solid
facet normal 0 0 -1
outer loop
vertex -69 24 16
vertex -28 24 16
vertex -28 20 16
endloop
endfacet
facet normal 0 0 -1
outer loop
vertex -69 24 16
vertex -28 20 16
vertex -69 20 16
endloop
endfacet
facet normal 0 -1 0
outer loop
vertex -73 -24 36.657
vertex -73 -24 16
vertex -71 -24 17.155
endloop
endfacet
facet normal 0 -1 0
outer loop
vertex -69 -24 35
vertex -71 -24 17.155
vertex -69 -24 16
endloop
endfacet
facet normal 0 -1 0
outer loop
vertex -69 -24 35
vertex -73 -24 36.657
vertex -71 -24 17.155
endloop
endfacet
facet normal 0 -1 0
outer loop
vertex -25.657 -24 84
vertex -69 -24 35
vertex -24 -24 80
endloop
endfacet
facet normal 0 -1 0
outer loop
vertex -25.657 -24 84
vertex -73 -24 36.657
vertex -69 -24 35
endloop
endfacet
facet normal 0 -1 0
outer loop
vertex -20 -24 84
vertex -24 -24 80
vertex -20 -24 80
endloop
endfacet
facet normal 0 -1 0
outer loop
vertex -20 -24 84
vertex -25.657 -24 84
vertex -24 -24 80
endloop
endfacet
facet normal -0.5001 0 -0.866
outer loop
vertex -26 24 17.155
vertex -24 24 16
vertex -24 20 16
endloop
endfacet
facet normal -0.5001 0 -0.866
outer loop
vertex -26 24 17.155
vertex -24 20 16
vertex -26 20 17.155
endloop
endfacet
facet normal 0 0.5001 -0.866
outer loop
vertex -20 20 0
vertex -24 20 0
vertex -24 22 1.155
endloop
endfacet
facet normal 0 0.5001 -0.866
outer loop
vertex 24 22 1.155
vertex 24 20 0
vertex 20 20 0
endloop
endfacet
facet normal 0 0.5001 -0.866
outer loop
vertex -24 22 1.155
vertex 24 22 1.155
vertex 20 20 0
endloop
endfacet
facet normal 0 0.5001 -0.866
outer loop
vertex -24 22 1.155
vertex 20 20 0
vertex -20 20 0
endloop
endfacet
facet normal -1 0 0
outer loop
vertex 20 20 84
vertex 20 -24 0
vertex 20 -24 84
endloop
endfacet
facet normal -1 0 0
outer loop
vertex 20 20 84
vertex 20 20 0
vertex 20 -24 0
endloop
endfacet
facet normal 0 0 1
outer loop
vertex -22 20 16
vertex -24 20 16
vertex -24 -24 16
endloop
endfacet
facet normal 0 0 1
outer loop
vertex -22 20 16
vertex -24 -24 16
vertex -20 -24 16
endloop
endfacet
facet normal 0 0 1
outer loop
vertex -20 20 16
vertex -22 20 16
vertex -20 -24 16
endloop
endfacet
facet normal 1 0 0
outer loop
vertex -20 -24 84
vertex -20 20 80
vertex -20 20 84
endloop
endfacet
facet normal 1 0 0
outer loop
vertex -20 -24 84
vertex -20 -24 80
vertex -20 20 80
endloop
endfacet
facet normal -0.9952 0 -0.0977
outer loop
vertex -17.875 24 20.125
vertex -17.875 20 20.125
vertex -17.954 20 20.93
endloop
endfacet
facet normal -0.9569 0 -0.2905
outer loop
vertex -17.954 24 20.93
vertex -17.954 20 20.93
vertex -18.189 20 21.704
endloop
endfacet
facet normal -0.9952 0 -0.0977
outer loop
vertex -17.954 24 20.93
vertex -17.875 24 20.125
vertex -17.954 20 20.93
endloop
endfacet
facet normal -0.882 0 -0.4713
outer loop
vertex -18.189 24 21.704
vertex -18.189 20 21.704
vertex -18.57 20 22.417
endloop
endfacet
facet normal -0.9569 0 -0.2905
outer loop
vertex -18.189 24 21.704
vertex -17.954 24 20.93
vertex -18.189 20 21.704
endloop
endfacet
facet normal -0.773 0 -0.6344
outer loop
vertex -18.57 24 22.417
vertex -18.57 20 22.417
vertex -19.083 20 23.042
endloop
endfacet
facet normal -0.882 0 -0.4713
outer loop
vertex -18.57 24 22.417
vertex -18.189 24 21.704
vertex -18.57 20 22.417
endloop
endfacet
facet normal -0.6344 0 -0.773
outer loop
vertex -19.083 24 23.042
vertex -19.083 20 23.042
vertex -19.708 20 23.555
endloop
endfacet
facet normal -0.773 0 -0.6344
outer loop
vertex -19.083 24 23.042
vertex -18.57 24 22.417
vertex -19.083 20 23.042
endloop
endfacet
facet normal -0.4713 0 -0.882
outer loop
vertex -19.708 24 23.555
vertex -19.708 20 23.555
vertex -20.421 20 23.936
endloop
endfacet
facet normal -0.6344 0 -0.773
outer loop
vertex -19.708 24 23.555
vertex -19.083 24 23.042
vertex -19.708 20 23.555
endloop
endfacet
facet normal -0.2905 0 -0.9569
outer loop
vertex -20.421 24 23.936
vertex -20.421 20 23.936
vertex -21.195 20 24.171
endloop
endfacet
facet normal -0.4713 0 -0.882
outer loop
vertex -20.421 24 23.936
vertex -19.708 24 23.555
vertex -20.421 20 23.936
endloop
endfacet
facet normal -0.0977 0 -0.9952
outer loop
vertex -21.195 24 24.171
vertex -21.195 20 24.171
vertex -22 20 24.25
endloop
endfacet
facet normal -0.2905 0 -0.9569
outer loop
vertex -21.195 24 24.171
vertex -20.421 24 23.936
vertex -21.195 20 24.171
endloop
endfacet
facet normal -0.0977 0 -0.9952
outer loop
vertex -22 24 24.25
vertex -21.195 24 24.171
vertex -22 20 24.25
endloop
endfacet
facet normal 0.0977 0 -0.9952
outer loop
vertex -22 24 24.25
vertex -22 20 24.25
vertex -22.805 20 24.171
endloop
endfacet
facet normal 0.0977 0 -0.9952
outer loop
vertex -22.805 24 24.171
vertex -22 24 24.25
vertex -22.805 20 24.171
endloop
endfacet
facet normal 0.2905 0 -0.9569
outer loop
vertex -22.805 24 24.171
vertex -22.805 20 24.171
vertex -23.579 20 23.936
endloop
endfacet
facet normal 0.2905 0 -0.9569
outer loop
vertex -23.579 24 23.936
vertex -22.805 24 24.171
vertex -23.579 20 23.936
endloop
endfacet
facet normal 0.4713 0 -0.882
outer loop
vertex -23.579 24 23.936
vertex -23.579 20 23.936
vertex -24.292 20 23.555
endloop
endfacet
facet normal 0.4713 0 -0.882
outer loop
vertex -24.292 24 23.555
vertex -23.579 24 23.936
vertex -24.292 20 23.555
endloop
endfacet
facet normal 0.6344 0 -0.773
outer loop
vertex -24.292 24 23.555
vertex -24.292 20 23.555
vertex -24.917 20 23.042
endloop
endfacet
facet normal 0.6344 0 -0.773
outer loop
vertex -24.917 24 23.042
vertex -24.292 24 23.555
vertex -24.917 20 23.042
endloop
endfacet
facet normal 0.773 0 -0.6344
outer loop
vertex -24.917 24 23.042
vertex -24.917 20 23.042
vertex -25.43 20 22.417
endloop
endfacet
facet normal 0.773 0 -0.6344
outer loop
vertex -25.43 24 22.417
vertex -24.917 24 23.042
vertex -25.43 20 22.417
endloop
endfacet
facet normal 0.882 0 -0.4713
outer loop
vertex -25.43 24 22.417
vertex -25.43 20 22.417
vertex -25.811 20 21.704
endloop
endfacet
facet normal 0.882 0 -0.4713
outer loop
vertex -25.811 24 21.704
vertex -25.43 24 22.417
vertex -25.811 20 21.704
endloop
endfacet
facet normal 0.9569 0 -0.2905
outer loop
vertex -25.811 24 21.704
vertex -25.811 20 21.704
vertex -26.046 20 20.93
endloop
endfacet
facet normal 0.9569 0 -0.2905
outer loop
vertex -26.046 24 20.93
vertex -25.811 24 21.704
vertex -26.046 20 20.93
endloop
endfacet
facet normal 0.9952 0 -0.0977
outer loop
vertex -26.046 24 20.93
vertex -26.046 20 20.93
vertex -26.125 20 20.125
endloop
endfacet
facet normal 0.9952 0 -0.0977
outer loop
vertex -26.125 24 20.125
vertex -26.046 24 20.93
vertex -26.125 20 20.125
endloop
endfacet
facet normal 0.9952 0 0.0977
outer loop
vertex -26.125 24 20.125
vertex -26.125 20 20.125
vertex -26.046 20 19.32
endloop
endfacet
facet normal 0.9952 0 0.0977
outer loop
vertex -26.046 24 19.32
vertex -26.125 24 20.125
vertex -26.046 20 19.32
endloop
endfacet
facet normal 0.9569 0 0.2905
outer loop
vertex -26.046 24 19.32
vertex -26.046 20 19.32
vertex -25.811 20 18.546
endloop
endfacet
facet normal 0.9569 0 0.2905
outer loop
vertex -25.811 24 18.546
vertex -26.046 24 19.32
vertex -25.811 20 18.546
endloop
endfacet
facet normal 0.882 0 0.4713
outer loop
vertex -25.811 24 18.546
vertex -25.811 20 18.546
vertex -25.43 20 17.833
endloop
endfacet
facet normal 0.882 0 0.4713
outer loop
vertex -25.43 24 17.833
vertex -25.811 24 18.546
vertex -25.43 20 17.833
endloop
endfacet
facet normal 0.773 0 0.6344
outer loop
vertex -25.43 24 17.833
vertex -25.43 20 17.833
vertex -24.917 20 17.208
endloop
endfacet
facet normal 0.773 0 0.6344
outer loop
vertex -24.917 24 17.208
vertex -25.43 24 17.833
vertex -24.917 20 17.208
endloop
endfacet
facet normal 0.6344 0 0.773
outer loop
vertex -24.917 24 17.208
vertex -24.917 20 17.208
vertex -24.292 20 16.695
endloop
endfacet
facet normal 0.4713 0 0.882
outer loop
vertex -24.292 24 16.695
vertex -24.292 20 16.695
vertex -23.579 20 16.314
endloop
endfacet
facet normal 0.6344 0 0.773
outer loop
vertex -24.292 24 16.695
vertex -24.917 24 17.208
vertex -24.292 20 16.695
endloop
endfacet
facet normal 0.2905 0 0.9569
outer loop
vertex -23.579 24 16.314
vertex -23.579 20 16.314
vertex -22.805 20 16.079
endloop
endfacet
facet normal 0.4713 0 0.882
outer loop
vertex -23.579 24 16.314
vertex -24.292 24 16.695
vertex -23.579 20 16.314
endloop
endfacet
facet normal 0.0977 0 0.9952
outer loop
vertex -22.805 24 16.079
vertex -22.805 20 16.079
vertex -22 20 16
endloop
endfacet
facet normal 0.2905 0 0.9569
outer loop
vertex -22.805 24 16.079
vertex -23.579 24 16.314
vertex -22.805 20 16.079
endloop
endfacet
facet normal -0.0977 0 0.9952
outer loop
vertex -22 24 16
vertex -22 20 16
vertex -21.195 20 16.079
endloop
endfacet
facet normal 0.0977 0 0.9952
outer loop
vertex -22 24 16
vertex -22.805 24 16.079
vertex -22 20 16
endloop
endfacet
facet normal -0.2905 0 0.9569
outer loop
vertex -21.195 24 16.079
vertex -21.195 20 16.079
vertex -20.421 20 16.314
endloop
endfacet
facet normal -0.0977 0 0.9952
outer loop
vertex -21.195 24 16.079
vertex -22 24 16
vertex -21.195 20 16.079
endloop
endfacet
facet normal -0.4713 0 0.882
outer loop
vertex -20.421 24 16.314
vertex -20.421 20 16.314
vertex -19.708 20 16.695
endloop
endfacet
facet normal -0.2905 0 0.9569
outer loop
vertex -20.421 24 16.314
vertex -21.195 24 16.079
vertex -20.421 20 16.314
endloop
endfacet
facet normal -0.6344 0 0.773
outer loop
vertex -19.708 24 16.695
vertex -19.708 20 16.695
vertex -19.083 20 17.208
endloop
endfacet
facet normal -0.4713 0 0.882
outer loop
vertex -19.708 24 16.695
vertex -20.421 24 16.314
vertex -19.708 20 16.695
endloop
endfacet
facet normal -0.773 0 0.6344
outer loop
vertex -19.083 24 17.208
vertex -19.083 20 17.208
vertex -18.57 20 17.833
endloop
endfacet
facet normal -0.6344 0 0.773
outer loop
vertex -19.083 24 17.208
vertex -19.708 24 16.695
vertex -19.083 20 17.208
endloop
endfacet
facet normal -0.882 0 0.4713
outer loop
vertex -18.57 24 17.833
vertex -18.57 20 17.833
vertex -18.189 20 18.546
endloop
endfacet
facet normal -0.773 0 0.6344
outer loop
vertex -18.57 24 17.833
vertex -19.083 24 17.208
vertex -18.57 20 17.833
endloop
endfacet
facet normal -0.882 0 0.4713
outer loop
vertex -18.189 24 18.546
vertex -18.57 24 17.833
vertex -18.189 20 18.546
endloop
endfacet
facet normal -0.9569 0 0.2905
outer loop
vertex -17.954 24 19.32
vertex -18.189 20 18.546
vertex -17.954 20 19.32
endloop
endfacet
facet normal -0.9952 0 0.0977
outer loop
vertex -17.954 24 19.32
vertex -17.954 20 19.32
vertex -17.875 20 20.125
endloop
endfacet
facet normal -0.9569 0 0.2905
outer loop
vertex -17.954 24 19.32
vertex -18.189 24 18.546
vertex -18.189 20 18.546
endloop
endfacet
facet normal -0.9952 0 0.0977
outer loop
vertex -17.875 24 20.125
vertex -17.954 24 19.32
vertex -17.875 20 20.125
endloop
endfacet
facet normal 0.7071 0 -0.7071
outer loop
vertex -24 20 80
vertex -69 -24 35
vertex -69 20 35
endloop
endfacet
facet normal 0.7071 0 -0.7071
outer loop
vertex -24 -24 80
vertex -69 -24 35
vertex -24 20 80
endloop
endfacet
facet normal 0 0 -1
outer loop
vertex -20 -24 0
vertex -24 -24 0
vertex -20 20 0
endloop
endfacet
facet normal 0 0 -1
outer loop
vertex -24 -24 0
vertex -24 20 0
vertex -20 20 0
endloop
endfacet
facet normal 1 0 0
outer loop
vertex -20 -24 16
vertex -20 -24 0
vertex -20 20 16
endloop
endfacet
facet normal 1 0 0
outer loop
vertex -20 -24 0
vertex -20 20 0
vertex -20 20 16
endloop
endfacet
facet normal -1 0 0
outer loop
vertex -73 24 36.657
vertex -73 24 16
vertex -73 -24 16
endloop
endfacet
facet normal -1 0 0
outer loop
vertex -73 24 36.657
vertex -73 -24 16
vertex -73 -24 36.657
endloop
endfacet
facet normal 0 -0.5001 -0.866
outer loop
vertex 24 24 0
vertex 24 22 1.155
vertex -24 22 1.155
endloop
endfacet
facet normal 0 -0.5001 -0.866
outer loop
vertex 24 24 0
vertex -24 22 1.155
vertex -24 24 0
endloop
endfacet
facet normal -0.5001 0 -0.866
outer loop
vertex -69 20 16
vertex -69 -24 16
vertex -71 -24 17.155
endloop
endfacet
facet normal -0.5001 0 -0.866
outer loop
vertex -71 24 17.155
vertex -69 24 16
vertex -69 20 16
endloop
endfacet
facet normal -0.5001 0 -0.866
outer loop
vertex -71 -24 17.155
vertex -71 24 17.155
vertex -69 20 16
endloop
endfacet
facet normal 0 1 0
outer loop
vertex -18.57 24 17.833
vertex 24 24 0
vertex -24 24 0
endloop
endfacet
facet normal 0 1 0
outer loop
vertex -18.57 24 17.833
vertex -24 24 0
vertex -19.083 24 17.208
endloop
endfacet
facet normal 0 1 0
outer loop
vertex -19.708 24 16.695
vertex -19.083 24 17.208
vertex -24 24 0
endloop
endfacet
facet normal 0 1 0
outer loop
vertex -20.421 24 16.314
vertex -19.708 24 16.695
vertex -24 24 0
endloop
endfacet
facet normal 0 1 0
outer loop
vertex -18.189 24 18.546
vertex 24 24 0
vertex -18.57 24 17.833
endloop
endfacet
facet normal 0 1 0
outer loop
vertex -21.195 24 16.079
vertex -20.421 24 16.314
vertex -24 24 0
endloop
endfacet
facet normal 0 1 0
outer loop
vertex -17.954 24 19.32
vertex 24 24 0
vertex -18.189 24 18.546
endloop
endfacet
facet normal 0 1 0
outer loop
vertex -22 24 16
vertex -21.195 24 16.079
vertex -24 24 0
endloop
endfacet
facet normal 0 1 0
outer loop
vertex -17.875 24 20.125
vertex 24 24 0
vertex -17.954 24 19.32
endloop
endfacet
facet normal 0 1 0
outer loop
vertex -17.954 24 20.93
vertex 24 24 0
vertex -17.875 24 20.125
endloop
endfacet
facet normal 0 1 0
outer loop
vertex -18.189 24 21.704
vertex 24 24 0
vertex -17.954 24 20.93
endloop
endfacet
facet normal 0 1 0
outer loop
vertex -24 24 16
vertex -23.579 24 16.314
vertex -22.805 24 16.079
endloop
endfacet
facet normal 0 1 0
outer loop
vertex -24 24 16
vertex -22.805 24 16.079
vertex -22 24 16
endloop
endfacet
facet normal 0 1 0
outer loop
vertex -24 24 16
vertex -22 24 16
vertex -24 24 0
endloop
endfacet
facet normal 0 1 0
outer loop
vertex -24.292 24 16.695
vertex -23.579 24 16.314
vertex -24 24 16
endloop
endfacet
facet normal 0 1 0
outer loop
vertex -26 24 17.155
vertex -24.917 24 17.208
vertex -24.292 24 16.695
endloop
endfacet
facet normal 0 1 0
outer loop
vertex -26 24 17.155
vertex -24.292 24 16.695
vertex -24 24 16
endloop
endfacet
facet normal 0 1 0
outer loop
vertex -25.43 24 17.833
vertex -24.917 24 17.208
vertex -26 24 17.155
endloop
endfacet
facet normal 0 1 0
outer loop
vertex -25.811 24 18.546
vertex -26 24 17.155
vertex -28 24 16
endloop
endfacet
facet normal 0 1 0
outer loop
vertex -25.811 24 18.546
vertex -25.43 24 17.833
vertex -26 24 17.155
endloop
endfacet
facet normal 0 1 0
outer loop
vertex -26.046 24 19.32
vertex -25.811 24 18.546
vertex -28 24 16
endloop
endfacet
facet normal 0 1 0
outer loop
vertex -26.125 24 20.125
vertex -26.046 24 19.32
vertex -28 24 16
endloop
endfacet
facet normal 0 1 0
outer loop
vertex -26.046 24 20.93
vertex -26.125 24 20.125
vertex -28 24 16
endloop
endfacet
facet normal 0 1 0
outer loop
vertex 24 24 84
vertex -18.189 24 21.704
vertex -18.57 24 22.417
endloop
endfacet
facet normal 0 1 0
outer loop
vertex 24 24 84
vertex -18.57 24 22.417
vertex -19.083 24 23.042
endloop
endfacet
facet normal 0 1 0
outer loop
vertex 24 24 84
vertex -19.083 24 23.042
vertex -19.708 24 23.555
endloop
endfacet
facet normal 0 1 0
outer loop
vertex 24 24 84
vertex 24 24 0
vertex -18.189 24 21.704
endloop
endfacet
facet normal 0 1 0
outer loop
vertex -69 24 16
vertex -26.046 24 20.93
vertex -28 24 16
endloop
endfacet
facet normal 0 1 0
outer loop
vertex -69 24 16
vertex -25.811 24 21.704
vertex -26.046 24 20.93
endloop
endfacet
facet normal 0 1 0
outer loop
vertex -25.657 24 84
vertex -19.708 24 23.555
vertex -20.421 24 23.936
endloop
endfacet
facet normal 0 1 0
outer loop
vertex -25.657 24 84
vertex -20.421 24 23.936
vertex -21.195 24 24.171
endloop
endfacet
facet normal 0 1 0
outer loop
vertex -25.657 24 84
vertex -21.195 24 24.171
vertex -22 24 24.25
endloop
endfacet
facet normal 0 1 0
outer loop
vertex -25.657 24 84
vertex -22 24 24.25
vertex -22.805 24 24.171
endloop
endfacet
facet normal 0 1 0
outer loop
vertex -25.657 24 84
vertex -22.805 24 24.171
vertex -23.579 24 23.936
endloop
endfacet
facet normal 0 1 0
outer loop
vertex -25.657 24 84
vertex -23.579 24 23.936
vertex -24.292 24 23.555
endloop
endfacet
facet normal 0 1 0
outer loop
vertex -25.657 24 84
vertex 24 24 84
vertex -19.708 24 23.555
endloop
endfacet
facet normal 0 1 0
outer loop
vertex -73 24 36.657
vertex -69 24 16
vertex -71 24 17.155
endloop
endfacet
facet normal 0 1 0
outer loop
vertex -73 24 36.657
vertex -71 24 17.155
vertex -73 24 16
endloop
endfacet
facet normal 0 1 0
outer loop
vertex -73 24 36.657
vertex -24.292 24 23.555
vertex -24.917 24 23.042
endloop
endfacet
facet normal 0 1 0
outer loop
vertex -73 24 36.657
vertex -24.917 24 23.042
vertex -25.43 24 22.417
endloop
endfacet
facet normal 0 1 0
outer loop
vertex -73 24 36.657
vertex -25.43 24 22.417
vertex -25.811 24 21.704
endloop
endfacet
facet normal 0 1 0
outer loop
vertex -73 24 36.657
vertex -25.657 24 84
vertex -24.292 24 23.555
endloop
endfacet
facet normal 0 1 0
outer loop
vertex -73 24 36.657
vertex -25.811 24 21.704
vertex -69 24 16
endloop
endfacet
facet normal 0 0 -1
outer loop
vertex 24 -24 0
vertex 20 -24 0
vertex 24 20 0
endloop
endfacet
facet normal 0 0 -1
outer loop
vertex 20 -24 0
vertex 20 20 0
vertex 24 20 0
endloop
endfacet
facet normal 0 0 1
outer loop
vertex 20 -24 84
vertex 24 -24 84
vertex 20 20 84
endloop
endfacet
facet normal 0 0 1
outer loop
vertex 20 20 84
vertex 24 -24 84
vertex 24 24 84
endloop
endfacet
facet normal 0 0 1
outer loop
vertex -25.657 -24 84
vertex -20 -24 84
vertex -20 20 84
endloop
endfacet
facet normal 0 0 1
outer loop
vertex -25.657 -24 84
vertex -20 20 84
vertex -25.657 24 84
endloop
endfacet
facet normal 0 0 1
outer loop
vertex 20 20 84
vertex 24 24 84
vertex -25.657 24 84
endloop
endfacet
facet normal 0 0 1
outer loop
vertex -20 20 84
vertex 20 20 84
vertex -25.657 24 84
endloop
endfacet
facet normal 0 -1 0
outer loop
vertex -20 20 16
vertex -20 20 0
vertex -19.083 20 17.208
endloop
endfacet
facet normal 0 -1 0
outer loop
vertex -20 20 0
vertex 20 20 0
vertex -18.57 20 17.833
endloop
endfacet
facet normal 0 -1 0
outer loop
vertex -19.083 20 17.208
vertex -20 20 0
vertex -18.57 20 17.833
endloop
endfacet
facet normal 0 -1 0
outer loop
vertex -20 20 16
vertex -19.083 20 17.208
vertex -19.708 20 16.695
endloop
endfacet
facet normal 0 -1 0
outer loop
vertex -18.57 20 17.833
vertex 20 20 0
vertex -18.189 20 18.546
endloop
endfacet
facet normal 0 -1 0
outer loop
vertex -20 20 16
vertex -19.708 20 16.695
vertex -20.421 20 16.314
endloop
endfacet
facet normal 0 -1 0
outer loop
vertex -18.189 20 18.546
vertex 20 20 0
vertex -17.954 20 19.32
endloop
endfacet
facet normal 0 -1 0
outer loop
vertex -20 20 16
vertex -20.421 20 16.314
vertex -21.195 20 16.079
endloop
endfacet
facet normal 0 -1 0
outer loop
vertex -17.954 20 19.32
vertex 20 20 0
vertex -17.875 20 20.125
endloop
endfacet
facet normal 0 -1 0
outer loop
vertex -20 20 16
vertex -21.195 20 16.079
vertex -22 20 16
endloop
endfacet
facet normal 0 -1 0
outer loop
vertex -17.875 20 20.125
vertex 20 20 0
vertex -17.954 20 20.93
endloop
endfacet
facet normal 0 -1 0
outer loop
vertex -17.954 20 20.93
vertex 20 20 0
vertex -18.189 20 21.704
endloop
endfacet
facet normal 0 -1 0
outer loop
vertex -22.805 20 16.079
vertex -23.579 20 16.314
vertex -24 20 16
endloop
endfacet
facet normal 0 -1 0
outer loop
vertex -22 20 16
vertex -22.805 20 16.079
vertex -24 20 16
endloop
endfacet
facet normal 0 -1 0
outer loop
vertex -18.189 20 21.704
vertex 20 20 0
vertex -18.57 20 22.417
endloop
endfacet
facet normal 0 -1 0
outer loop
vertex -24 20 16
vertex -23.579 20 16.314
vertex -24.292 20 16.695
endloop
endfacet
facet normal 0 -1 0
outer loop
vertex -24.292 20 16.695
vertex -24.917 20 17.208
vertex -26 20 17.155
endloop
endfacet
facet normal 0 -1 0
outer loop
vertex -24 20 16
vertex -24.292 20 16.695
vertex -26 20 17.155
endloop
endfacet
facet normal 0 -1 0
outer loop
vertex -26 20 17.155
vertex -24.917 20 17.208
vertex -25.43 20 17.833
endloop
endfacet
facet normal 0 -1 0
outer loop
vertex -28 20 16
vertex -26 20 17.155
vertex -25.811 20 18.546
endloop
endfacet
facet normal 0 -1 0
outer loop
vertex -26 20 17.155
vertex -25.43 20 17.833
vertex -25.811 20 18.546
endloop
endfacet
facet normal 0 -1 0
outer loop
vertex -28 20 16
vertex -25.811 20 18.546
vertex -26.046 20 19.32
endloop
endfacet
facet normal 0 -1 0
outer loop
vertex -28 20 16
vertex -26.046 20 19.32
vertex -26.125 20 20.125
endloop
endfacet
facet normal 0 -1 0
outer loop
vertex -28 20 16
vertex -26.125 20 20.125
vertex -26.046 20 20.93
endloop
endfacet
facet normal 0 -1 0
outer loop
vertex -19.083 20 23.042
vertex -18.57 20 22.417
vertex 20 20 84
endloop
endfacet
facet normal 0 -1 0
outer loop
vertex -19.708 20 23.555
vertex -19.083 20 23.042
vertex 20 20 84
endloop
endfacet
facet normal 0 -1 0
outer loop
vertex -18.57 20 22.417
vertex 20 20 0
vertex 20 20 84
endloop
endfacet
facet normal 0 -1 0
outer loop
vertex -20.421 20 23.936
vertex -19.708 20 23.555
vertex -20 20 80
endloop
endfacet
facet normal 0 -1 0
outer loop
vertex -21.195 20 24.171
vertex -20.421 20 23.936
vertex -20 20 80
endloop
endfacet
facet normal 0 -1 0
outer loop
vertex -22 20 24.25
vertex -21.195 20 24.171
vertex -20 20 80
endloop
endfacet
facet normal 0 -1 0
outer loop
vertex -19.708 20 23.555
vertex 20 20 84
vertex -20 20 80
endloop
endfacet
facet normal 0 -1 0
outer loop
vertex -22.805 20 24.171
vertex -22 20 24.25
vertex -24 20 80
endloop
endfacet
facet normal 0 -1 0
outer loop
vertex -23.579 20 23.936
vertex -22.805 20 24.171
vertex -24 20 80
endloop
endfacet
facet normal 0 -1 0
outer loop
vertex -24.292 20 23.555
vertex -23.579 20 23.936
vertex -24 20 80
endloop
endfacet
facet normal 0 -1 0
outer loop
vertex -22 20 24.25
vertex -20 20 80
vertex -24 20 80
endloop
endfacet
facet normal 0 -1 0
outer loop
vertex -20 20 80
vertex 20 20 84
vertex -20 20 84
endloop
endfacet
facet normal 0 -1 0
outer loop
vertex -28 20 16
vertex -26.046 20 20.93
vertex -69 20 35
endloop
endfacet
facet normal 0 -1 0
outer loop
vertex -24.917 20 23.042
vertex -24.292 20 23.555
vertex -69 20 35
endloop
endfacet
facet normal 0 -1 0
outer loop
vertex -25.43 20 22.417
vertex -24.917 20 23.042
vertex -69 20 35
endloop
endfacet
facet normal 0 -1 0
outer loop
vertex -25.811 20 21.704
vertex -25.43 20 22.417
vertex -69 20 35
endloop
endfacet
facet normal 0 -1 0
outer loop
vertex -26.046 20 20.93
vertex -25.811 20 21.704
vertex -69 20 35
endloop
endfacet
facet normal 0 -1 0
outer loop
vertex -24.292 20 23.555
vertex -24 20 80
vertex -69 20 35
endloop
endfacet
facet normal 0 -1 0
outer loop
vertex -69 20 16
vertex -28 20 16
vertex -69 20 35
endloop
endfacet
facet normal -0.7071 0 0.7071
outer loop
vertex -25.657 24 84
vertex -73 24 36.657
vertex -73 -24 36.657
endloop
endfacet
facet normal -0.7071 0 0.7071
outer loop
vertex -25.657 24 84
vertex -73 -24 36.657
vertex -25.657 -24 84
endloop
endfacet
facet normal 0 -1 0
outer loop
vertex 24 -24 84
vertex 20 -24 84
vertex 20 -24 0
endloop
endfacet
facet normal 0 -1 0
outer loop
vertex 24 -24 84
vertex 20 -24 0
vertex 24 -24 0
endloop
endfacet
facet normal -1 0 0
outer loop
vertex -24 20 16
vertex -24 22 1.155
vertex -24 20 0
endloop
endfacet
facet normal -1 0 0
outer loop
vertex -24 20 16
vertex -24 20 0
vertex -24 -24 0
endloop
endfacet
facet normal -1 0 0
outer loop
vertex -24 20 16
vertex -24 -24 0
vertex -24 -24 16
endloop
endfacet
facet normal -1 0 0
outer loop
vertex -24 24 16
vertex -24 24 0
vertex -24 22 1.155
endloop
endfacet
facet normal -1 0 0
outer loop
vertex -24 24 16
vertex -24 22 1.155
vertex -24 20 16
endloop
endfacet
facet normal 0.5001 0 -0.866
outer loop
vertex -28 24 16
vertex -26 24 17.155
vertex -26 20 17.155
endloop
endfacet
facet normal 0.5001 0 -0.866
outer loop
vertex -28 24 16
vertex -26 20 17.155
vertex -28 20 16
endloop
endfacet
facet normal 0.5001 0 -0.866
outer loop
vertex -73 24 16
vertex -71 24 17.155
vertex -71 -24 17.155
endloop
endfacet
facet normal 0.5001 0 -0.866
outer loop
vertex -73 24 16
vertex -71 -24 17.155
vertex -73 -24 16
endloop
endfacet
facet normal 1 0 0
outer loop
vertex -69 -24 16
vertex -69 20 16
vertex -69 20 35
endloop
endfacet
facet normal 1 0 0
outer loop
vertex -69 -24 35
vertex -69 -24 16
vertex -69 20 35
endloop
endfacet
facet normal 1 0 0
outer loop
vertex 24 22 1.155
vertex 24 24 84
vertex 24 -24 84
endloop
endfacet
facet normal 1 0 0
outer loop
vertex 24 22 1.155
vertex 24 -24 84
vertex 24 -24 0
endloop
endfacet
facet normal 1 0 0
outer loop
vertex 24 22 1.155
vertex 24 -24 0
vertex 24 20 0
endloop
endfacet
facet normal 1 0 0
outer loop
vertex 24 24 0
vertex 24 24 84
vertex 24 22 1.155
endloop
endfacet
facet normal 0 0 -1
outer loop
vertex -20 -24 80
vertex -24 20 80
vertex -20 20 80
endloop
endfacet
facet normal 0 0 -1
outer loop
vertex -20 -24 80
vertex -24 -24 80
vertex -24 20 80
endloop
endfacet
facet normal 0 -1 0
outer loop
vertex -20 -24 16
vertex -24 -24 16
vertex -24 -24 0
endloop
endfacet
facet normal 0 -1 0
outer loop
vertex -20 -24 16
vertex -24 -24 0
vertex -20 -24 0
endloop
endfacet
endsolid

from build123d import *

# Parameters (mm, degrees)
EXTRUDE015_DEPTH = 25
SKETCH011_R      = 4.125
EXTRUDE013_DEPTH = 4
SKETCH010_W      = 4
SKETCH010_H      = 84
SKETCH010_H_2    = 16
EXTRUDE012_DEPTH = 22


with BuildPart() as extrude015:
    # Sketch013 → Extrude015 (new body, symmetric)
    with BuildSketch(Plane.YZ):
        Polygon((-24, 0), (-22, 1.154701), (-20, 0), align=None)
    extrude(amount=EXTRUDE015_DEPTH, both=True)


with BuildPart() as extrude015_1:
    # Extrude015 placement: moved
    add(extrude015.part.moved(Location((0, 44, 0))))


with BuildPart() as cut001:
    # Sketch011 → Extrude013 (new body)
    with BuildSketch(Plane.XZ):
        Polygon((24, 0), (20, 0), (-20, 0), (-24, 0), (-24, 16), (-26, 17.154701), (-28, 16), (-69, 16), (-71, 17.154701), (-73, 16), (-73, 36.656854), (-25.656854, 84), (-20, 84), (20, 84), (24, 84), align=None)
        with Locations((-22, 20.125)):
            Circle(SKETCH011_R, mode=Mode.SUBTRACT)
    extrude(amount=EXTRUDE013_DEPTH)


with BuildPart() as cut001_1:
    # Extrude013 placement: moved
    add(cut001.part.moved(Location((0, 24, 0))))

    # Cut001: cut Extrude015
    add(extrude015_1.part, mode=Mode.SUBTRACT)


with BuildPart() as reject_path:
    # Sketch010 → Extrude012 (new body, symmetric)
    with BuildSketch(Plane.XZ):
        with Locations((22, 42)):
            Rectangle(SKETCH010_W, SKETCH010_H)
        with Locations((-22, 8)):
            Rectangle(SKETCH010_W, SKETCH010_H_2)
        Polygon((-20, 84), (-25.656854, 84), (-73, 36.656854), (-73, 16), (-71, 17.154701), (-69, 16), (-69, 35), (-24, 80), (-20, 80), align=None)
    extrude(amount=EXTRUDE012_DEPTH, both=True)


with BuildPart() as reject_path_1:
    # Extrude012 placement: moved
    add(reject_path.part.moved(Location((0, -2, 0))))

    # Fusion004: union Cut001
    add(cut001_1.part)


solid = reject_path_1.part
